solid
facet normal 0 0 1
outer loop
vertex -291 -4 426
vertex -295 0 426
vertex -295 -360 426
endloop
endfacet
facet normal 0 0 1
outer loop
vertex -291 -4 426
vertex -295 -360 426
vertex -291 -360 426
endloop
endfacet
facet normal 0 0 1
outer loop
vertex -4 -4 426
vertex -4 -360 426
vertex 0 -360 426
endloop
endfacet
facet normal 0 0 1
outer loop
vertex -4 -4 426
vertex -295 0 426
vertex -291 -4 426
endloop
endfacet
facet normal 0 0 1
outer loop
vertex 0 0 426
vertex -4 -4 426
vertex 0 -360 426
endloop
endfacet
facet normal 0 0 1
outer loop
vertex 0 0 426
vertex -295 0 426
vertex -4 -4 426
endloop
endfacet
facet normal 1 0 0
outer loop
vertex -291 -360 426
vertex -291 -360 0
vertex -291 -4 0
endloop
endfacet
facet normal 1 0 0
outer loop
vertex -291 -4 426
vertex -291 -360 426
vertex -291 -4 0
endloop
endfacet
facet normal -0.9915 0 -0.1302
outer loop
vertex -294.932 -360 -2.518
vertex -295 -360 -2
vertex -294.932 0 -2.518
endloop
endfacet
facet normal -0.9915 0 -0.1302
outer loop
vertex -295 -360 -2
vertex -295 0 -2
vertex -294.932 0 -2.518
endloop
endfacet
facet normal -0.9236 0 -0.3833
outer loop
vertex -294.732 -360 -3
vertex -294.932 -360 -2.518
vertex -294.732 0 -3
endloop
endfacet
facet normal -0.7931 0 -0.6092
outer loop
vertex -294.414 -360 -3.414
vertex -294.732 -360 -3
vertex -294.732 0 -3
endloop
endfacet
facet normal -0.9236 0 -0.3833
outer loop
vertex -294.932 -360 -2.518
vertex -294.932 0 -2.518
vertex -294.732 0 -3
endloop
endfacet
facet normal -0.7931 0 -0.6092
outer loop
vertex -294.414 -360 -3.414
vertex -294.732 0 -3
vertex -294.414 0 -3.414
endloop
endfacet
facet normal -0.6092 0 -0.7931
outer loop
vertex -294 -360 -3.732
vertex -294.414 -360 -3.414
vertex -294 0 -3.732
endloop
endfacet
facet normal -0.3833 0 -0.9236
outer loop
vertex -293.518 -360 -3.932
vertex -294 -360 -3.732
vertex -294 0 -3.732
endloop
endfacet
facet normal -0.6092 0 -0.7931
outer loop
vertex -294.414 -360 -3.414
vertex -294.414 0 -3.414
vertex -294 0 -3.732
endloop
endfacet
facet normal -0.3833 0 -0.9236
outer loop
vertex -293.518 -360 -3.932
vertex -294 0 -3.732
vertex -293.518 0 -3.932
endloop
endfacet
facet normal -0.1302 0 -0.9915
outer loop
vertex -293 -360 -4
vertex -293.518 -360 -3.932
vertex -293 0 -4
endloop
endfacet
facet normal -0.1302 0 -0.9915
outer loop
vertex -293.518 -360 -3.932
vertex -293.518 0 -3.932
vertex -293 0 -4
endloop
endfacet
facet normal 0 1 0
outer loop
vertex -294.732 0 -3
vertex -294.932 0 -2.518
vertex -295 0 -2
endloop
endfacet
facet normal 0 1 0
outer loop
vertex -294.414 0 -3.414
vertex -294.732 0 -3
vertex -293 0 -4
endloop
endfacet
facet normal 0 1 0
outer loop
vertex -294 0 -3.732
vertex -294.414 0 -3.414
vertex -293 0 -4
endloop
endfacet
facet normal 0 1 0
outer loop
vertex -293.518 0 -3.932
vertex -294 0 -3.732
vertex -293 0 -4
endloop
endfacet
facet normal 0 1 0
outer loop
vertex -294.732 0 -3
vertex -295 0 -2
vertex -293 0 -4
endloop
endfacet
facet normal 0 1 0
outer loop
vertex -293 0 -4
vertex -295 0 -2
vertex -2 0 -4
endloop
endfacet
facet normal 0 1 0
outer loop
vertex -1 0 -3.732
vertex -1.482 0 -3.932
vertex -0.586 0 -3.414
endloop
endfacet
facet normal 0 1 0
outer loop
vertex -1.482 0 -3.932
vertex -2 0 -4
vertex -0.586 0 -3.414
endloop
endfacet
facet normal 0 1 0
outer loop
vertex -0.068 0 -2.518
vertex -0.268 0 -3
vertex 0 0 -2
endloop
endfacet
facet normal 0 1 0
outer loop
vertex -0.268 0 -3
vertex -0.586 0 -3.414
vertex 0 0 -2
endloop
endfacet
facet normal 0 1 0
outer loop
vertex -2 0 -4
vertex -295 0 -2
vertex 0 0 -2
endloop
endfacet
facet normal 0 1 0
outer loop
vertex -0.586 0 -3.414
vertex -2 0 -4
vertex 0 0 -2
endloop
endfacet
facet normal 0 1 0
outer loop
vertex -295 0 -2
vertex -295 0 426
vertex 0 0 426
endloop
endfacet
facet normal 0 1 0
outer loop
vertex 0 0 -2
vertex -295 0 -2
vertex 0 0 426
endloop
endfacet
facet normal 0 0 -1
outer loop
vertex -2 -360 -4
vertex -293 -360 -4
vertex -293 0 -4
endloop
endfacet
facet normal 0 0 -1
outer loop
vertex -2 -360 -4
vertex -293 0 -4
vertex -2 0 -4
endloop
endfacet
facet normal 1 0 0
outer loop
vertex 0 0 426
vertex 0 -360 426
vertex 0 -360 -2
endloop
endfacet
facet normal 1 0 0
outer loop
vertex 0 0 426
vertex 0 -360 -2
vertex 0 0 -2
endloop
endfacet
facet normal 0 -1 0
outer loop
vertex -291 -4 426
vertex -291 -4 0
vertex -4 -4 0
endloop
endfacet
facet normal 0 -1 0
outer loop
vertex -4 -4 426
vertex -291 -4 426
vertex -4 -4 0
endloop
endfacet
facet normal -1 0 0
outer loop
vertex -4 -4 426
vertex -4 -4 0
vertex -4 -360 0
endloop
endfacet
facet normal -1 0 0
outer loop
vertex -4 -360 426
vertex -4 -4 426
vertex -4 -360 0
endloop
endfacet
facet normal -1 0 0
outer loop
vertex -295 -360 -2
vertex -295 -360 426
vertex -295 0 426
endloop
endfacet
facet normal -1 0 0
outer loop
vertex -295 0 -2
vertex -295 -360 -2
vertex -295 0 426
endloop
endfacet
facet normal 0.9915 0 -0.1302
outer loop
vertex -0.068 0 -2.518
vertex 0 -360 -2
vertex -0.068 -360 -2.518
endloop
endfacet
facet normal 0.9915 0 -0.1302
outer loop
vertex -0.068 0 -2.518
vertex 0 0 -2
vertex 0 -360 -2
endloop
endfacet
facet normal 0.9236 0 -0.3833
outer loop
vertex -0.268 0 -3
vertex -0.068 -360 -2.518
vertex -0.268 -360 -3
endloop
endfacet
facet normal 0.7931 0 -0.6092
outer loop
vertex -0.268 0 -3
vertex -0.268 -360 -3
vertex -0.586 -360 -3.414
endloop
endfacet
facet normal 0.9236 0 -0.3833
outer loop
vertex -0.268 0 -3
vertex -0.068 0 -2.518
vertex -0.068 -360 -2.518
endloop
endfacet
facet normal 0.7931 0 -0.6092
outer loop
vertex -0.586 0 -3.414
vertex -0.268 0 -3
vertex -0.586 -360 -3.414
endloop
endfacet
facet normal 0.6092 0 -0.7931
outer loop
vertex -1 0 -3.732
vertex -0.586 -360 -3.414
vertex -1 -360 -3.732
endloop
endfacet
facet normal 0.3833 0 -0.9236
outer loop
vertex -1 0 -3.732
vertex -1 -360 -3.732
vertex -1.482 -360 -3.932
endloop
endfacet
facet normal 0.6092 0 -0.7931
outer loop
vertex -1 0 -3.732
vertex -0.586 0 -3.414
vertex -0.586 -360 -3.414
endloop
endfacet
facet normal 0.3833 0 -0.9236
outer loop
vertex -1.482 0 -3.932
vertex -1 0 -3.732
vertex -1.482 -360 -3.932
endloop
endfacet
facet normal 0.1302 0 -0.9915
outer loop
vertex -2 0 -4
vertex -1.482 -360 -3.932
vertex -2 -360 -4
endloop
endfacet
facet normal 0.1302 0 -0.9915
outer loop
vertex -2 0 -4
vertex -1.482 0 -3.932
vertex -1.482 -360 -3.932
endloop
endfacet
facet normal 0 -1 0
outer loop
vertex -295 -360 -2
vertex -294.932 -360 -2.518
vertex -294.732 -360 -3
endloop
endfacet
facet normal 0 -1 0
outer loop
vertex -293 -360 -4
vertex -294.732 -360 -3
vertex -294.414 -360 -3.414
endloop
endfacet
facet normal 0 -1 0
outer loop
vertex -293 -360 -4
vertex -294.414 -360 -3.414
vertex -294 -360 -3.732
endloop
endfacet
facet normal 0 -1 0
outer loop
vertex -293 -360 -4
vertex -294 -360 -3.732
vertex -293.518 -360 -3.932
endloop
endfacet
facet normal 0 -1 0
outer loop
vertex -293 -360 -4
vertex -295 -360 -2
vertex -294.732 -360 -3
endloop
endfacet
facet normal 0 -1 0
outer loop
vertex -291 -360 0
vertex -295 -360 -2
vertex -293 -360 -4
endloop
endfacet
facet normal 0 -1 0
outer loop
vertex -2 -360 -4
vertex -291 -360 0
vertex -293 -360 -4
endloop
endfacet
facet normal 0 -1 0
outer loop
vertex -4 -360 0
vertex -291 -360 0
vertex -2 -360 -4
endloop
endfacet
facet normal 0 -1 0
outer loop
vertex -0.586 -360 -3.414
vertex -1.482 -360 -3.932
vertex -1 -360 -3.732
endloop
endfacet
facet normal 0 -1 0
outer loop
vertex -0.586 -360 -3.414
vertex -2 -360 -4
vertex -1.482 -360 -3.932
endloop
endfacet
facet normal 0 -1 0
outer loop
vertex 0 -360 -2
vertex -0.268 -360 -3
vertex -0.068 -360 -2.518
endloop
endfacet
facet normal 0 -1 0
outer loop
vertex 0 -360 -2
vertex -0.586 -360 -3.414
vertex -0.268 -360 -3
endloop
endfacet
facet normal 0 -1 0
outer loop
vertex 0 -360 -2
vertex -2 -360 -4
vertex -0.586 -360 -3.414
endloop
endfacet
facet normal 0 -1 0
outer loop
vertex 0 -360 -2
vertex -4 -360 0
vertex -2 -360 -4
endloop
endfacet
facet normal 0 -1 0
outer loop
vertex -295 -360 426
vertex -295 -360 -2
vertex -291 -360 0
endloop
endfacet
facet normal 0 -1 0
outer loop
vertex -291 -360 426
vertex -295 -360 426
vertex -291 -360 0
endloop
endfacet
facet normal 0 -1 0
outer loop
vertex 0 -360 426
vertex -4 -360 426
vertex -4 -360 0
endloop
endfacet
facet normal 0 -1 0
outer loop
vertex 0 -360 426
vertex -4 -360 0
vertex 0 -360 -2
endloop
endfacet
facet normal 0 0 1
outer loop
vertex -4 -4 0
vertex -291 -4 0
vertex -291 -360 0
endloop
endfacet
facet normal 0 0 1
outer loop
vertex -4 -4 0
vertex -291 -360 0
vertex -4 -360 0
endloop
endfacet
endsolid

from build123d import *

# Parameters (mm, degrees)
F1_DEPTH = 426
F2_W     = 295
F2_H     = 360
F3_DEPTH = 4
F4_R     = 2


# Not quite as in the source:
# - a feature names something its author has since deleted; it is built from what else it names


with BuildPart() as f1:
    # F0 (on Top) → F1 (new body)
    with BuildSketch(Plane.XY):
        Polygon((-4, -360), (0, -360), (0, 0), (-295, 0), (-295, -360), (-291, -360), (-291, -4), (-4, -4), align=None)
    extrude(amount=F1_DEPTH)

    # F2 (on Top) → F3 (join)
    with BuildSketch(Plane.XY):
        with Locations((-147.5, -180)):
            Rectangle(F2_W, F2_H)
    extrude(amount=-F3_DEPTH)

    # F4
    f4_edges = [f1.edges().sort_by_distance(p)[0] for p in [
        (-295, -180, -4),
        (0, -180, -4),
    ]]
    fillet(f4_edges, radius=F4_R)


solid = f1.part
